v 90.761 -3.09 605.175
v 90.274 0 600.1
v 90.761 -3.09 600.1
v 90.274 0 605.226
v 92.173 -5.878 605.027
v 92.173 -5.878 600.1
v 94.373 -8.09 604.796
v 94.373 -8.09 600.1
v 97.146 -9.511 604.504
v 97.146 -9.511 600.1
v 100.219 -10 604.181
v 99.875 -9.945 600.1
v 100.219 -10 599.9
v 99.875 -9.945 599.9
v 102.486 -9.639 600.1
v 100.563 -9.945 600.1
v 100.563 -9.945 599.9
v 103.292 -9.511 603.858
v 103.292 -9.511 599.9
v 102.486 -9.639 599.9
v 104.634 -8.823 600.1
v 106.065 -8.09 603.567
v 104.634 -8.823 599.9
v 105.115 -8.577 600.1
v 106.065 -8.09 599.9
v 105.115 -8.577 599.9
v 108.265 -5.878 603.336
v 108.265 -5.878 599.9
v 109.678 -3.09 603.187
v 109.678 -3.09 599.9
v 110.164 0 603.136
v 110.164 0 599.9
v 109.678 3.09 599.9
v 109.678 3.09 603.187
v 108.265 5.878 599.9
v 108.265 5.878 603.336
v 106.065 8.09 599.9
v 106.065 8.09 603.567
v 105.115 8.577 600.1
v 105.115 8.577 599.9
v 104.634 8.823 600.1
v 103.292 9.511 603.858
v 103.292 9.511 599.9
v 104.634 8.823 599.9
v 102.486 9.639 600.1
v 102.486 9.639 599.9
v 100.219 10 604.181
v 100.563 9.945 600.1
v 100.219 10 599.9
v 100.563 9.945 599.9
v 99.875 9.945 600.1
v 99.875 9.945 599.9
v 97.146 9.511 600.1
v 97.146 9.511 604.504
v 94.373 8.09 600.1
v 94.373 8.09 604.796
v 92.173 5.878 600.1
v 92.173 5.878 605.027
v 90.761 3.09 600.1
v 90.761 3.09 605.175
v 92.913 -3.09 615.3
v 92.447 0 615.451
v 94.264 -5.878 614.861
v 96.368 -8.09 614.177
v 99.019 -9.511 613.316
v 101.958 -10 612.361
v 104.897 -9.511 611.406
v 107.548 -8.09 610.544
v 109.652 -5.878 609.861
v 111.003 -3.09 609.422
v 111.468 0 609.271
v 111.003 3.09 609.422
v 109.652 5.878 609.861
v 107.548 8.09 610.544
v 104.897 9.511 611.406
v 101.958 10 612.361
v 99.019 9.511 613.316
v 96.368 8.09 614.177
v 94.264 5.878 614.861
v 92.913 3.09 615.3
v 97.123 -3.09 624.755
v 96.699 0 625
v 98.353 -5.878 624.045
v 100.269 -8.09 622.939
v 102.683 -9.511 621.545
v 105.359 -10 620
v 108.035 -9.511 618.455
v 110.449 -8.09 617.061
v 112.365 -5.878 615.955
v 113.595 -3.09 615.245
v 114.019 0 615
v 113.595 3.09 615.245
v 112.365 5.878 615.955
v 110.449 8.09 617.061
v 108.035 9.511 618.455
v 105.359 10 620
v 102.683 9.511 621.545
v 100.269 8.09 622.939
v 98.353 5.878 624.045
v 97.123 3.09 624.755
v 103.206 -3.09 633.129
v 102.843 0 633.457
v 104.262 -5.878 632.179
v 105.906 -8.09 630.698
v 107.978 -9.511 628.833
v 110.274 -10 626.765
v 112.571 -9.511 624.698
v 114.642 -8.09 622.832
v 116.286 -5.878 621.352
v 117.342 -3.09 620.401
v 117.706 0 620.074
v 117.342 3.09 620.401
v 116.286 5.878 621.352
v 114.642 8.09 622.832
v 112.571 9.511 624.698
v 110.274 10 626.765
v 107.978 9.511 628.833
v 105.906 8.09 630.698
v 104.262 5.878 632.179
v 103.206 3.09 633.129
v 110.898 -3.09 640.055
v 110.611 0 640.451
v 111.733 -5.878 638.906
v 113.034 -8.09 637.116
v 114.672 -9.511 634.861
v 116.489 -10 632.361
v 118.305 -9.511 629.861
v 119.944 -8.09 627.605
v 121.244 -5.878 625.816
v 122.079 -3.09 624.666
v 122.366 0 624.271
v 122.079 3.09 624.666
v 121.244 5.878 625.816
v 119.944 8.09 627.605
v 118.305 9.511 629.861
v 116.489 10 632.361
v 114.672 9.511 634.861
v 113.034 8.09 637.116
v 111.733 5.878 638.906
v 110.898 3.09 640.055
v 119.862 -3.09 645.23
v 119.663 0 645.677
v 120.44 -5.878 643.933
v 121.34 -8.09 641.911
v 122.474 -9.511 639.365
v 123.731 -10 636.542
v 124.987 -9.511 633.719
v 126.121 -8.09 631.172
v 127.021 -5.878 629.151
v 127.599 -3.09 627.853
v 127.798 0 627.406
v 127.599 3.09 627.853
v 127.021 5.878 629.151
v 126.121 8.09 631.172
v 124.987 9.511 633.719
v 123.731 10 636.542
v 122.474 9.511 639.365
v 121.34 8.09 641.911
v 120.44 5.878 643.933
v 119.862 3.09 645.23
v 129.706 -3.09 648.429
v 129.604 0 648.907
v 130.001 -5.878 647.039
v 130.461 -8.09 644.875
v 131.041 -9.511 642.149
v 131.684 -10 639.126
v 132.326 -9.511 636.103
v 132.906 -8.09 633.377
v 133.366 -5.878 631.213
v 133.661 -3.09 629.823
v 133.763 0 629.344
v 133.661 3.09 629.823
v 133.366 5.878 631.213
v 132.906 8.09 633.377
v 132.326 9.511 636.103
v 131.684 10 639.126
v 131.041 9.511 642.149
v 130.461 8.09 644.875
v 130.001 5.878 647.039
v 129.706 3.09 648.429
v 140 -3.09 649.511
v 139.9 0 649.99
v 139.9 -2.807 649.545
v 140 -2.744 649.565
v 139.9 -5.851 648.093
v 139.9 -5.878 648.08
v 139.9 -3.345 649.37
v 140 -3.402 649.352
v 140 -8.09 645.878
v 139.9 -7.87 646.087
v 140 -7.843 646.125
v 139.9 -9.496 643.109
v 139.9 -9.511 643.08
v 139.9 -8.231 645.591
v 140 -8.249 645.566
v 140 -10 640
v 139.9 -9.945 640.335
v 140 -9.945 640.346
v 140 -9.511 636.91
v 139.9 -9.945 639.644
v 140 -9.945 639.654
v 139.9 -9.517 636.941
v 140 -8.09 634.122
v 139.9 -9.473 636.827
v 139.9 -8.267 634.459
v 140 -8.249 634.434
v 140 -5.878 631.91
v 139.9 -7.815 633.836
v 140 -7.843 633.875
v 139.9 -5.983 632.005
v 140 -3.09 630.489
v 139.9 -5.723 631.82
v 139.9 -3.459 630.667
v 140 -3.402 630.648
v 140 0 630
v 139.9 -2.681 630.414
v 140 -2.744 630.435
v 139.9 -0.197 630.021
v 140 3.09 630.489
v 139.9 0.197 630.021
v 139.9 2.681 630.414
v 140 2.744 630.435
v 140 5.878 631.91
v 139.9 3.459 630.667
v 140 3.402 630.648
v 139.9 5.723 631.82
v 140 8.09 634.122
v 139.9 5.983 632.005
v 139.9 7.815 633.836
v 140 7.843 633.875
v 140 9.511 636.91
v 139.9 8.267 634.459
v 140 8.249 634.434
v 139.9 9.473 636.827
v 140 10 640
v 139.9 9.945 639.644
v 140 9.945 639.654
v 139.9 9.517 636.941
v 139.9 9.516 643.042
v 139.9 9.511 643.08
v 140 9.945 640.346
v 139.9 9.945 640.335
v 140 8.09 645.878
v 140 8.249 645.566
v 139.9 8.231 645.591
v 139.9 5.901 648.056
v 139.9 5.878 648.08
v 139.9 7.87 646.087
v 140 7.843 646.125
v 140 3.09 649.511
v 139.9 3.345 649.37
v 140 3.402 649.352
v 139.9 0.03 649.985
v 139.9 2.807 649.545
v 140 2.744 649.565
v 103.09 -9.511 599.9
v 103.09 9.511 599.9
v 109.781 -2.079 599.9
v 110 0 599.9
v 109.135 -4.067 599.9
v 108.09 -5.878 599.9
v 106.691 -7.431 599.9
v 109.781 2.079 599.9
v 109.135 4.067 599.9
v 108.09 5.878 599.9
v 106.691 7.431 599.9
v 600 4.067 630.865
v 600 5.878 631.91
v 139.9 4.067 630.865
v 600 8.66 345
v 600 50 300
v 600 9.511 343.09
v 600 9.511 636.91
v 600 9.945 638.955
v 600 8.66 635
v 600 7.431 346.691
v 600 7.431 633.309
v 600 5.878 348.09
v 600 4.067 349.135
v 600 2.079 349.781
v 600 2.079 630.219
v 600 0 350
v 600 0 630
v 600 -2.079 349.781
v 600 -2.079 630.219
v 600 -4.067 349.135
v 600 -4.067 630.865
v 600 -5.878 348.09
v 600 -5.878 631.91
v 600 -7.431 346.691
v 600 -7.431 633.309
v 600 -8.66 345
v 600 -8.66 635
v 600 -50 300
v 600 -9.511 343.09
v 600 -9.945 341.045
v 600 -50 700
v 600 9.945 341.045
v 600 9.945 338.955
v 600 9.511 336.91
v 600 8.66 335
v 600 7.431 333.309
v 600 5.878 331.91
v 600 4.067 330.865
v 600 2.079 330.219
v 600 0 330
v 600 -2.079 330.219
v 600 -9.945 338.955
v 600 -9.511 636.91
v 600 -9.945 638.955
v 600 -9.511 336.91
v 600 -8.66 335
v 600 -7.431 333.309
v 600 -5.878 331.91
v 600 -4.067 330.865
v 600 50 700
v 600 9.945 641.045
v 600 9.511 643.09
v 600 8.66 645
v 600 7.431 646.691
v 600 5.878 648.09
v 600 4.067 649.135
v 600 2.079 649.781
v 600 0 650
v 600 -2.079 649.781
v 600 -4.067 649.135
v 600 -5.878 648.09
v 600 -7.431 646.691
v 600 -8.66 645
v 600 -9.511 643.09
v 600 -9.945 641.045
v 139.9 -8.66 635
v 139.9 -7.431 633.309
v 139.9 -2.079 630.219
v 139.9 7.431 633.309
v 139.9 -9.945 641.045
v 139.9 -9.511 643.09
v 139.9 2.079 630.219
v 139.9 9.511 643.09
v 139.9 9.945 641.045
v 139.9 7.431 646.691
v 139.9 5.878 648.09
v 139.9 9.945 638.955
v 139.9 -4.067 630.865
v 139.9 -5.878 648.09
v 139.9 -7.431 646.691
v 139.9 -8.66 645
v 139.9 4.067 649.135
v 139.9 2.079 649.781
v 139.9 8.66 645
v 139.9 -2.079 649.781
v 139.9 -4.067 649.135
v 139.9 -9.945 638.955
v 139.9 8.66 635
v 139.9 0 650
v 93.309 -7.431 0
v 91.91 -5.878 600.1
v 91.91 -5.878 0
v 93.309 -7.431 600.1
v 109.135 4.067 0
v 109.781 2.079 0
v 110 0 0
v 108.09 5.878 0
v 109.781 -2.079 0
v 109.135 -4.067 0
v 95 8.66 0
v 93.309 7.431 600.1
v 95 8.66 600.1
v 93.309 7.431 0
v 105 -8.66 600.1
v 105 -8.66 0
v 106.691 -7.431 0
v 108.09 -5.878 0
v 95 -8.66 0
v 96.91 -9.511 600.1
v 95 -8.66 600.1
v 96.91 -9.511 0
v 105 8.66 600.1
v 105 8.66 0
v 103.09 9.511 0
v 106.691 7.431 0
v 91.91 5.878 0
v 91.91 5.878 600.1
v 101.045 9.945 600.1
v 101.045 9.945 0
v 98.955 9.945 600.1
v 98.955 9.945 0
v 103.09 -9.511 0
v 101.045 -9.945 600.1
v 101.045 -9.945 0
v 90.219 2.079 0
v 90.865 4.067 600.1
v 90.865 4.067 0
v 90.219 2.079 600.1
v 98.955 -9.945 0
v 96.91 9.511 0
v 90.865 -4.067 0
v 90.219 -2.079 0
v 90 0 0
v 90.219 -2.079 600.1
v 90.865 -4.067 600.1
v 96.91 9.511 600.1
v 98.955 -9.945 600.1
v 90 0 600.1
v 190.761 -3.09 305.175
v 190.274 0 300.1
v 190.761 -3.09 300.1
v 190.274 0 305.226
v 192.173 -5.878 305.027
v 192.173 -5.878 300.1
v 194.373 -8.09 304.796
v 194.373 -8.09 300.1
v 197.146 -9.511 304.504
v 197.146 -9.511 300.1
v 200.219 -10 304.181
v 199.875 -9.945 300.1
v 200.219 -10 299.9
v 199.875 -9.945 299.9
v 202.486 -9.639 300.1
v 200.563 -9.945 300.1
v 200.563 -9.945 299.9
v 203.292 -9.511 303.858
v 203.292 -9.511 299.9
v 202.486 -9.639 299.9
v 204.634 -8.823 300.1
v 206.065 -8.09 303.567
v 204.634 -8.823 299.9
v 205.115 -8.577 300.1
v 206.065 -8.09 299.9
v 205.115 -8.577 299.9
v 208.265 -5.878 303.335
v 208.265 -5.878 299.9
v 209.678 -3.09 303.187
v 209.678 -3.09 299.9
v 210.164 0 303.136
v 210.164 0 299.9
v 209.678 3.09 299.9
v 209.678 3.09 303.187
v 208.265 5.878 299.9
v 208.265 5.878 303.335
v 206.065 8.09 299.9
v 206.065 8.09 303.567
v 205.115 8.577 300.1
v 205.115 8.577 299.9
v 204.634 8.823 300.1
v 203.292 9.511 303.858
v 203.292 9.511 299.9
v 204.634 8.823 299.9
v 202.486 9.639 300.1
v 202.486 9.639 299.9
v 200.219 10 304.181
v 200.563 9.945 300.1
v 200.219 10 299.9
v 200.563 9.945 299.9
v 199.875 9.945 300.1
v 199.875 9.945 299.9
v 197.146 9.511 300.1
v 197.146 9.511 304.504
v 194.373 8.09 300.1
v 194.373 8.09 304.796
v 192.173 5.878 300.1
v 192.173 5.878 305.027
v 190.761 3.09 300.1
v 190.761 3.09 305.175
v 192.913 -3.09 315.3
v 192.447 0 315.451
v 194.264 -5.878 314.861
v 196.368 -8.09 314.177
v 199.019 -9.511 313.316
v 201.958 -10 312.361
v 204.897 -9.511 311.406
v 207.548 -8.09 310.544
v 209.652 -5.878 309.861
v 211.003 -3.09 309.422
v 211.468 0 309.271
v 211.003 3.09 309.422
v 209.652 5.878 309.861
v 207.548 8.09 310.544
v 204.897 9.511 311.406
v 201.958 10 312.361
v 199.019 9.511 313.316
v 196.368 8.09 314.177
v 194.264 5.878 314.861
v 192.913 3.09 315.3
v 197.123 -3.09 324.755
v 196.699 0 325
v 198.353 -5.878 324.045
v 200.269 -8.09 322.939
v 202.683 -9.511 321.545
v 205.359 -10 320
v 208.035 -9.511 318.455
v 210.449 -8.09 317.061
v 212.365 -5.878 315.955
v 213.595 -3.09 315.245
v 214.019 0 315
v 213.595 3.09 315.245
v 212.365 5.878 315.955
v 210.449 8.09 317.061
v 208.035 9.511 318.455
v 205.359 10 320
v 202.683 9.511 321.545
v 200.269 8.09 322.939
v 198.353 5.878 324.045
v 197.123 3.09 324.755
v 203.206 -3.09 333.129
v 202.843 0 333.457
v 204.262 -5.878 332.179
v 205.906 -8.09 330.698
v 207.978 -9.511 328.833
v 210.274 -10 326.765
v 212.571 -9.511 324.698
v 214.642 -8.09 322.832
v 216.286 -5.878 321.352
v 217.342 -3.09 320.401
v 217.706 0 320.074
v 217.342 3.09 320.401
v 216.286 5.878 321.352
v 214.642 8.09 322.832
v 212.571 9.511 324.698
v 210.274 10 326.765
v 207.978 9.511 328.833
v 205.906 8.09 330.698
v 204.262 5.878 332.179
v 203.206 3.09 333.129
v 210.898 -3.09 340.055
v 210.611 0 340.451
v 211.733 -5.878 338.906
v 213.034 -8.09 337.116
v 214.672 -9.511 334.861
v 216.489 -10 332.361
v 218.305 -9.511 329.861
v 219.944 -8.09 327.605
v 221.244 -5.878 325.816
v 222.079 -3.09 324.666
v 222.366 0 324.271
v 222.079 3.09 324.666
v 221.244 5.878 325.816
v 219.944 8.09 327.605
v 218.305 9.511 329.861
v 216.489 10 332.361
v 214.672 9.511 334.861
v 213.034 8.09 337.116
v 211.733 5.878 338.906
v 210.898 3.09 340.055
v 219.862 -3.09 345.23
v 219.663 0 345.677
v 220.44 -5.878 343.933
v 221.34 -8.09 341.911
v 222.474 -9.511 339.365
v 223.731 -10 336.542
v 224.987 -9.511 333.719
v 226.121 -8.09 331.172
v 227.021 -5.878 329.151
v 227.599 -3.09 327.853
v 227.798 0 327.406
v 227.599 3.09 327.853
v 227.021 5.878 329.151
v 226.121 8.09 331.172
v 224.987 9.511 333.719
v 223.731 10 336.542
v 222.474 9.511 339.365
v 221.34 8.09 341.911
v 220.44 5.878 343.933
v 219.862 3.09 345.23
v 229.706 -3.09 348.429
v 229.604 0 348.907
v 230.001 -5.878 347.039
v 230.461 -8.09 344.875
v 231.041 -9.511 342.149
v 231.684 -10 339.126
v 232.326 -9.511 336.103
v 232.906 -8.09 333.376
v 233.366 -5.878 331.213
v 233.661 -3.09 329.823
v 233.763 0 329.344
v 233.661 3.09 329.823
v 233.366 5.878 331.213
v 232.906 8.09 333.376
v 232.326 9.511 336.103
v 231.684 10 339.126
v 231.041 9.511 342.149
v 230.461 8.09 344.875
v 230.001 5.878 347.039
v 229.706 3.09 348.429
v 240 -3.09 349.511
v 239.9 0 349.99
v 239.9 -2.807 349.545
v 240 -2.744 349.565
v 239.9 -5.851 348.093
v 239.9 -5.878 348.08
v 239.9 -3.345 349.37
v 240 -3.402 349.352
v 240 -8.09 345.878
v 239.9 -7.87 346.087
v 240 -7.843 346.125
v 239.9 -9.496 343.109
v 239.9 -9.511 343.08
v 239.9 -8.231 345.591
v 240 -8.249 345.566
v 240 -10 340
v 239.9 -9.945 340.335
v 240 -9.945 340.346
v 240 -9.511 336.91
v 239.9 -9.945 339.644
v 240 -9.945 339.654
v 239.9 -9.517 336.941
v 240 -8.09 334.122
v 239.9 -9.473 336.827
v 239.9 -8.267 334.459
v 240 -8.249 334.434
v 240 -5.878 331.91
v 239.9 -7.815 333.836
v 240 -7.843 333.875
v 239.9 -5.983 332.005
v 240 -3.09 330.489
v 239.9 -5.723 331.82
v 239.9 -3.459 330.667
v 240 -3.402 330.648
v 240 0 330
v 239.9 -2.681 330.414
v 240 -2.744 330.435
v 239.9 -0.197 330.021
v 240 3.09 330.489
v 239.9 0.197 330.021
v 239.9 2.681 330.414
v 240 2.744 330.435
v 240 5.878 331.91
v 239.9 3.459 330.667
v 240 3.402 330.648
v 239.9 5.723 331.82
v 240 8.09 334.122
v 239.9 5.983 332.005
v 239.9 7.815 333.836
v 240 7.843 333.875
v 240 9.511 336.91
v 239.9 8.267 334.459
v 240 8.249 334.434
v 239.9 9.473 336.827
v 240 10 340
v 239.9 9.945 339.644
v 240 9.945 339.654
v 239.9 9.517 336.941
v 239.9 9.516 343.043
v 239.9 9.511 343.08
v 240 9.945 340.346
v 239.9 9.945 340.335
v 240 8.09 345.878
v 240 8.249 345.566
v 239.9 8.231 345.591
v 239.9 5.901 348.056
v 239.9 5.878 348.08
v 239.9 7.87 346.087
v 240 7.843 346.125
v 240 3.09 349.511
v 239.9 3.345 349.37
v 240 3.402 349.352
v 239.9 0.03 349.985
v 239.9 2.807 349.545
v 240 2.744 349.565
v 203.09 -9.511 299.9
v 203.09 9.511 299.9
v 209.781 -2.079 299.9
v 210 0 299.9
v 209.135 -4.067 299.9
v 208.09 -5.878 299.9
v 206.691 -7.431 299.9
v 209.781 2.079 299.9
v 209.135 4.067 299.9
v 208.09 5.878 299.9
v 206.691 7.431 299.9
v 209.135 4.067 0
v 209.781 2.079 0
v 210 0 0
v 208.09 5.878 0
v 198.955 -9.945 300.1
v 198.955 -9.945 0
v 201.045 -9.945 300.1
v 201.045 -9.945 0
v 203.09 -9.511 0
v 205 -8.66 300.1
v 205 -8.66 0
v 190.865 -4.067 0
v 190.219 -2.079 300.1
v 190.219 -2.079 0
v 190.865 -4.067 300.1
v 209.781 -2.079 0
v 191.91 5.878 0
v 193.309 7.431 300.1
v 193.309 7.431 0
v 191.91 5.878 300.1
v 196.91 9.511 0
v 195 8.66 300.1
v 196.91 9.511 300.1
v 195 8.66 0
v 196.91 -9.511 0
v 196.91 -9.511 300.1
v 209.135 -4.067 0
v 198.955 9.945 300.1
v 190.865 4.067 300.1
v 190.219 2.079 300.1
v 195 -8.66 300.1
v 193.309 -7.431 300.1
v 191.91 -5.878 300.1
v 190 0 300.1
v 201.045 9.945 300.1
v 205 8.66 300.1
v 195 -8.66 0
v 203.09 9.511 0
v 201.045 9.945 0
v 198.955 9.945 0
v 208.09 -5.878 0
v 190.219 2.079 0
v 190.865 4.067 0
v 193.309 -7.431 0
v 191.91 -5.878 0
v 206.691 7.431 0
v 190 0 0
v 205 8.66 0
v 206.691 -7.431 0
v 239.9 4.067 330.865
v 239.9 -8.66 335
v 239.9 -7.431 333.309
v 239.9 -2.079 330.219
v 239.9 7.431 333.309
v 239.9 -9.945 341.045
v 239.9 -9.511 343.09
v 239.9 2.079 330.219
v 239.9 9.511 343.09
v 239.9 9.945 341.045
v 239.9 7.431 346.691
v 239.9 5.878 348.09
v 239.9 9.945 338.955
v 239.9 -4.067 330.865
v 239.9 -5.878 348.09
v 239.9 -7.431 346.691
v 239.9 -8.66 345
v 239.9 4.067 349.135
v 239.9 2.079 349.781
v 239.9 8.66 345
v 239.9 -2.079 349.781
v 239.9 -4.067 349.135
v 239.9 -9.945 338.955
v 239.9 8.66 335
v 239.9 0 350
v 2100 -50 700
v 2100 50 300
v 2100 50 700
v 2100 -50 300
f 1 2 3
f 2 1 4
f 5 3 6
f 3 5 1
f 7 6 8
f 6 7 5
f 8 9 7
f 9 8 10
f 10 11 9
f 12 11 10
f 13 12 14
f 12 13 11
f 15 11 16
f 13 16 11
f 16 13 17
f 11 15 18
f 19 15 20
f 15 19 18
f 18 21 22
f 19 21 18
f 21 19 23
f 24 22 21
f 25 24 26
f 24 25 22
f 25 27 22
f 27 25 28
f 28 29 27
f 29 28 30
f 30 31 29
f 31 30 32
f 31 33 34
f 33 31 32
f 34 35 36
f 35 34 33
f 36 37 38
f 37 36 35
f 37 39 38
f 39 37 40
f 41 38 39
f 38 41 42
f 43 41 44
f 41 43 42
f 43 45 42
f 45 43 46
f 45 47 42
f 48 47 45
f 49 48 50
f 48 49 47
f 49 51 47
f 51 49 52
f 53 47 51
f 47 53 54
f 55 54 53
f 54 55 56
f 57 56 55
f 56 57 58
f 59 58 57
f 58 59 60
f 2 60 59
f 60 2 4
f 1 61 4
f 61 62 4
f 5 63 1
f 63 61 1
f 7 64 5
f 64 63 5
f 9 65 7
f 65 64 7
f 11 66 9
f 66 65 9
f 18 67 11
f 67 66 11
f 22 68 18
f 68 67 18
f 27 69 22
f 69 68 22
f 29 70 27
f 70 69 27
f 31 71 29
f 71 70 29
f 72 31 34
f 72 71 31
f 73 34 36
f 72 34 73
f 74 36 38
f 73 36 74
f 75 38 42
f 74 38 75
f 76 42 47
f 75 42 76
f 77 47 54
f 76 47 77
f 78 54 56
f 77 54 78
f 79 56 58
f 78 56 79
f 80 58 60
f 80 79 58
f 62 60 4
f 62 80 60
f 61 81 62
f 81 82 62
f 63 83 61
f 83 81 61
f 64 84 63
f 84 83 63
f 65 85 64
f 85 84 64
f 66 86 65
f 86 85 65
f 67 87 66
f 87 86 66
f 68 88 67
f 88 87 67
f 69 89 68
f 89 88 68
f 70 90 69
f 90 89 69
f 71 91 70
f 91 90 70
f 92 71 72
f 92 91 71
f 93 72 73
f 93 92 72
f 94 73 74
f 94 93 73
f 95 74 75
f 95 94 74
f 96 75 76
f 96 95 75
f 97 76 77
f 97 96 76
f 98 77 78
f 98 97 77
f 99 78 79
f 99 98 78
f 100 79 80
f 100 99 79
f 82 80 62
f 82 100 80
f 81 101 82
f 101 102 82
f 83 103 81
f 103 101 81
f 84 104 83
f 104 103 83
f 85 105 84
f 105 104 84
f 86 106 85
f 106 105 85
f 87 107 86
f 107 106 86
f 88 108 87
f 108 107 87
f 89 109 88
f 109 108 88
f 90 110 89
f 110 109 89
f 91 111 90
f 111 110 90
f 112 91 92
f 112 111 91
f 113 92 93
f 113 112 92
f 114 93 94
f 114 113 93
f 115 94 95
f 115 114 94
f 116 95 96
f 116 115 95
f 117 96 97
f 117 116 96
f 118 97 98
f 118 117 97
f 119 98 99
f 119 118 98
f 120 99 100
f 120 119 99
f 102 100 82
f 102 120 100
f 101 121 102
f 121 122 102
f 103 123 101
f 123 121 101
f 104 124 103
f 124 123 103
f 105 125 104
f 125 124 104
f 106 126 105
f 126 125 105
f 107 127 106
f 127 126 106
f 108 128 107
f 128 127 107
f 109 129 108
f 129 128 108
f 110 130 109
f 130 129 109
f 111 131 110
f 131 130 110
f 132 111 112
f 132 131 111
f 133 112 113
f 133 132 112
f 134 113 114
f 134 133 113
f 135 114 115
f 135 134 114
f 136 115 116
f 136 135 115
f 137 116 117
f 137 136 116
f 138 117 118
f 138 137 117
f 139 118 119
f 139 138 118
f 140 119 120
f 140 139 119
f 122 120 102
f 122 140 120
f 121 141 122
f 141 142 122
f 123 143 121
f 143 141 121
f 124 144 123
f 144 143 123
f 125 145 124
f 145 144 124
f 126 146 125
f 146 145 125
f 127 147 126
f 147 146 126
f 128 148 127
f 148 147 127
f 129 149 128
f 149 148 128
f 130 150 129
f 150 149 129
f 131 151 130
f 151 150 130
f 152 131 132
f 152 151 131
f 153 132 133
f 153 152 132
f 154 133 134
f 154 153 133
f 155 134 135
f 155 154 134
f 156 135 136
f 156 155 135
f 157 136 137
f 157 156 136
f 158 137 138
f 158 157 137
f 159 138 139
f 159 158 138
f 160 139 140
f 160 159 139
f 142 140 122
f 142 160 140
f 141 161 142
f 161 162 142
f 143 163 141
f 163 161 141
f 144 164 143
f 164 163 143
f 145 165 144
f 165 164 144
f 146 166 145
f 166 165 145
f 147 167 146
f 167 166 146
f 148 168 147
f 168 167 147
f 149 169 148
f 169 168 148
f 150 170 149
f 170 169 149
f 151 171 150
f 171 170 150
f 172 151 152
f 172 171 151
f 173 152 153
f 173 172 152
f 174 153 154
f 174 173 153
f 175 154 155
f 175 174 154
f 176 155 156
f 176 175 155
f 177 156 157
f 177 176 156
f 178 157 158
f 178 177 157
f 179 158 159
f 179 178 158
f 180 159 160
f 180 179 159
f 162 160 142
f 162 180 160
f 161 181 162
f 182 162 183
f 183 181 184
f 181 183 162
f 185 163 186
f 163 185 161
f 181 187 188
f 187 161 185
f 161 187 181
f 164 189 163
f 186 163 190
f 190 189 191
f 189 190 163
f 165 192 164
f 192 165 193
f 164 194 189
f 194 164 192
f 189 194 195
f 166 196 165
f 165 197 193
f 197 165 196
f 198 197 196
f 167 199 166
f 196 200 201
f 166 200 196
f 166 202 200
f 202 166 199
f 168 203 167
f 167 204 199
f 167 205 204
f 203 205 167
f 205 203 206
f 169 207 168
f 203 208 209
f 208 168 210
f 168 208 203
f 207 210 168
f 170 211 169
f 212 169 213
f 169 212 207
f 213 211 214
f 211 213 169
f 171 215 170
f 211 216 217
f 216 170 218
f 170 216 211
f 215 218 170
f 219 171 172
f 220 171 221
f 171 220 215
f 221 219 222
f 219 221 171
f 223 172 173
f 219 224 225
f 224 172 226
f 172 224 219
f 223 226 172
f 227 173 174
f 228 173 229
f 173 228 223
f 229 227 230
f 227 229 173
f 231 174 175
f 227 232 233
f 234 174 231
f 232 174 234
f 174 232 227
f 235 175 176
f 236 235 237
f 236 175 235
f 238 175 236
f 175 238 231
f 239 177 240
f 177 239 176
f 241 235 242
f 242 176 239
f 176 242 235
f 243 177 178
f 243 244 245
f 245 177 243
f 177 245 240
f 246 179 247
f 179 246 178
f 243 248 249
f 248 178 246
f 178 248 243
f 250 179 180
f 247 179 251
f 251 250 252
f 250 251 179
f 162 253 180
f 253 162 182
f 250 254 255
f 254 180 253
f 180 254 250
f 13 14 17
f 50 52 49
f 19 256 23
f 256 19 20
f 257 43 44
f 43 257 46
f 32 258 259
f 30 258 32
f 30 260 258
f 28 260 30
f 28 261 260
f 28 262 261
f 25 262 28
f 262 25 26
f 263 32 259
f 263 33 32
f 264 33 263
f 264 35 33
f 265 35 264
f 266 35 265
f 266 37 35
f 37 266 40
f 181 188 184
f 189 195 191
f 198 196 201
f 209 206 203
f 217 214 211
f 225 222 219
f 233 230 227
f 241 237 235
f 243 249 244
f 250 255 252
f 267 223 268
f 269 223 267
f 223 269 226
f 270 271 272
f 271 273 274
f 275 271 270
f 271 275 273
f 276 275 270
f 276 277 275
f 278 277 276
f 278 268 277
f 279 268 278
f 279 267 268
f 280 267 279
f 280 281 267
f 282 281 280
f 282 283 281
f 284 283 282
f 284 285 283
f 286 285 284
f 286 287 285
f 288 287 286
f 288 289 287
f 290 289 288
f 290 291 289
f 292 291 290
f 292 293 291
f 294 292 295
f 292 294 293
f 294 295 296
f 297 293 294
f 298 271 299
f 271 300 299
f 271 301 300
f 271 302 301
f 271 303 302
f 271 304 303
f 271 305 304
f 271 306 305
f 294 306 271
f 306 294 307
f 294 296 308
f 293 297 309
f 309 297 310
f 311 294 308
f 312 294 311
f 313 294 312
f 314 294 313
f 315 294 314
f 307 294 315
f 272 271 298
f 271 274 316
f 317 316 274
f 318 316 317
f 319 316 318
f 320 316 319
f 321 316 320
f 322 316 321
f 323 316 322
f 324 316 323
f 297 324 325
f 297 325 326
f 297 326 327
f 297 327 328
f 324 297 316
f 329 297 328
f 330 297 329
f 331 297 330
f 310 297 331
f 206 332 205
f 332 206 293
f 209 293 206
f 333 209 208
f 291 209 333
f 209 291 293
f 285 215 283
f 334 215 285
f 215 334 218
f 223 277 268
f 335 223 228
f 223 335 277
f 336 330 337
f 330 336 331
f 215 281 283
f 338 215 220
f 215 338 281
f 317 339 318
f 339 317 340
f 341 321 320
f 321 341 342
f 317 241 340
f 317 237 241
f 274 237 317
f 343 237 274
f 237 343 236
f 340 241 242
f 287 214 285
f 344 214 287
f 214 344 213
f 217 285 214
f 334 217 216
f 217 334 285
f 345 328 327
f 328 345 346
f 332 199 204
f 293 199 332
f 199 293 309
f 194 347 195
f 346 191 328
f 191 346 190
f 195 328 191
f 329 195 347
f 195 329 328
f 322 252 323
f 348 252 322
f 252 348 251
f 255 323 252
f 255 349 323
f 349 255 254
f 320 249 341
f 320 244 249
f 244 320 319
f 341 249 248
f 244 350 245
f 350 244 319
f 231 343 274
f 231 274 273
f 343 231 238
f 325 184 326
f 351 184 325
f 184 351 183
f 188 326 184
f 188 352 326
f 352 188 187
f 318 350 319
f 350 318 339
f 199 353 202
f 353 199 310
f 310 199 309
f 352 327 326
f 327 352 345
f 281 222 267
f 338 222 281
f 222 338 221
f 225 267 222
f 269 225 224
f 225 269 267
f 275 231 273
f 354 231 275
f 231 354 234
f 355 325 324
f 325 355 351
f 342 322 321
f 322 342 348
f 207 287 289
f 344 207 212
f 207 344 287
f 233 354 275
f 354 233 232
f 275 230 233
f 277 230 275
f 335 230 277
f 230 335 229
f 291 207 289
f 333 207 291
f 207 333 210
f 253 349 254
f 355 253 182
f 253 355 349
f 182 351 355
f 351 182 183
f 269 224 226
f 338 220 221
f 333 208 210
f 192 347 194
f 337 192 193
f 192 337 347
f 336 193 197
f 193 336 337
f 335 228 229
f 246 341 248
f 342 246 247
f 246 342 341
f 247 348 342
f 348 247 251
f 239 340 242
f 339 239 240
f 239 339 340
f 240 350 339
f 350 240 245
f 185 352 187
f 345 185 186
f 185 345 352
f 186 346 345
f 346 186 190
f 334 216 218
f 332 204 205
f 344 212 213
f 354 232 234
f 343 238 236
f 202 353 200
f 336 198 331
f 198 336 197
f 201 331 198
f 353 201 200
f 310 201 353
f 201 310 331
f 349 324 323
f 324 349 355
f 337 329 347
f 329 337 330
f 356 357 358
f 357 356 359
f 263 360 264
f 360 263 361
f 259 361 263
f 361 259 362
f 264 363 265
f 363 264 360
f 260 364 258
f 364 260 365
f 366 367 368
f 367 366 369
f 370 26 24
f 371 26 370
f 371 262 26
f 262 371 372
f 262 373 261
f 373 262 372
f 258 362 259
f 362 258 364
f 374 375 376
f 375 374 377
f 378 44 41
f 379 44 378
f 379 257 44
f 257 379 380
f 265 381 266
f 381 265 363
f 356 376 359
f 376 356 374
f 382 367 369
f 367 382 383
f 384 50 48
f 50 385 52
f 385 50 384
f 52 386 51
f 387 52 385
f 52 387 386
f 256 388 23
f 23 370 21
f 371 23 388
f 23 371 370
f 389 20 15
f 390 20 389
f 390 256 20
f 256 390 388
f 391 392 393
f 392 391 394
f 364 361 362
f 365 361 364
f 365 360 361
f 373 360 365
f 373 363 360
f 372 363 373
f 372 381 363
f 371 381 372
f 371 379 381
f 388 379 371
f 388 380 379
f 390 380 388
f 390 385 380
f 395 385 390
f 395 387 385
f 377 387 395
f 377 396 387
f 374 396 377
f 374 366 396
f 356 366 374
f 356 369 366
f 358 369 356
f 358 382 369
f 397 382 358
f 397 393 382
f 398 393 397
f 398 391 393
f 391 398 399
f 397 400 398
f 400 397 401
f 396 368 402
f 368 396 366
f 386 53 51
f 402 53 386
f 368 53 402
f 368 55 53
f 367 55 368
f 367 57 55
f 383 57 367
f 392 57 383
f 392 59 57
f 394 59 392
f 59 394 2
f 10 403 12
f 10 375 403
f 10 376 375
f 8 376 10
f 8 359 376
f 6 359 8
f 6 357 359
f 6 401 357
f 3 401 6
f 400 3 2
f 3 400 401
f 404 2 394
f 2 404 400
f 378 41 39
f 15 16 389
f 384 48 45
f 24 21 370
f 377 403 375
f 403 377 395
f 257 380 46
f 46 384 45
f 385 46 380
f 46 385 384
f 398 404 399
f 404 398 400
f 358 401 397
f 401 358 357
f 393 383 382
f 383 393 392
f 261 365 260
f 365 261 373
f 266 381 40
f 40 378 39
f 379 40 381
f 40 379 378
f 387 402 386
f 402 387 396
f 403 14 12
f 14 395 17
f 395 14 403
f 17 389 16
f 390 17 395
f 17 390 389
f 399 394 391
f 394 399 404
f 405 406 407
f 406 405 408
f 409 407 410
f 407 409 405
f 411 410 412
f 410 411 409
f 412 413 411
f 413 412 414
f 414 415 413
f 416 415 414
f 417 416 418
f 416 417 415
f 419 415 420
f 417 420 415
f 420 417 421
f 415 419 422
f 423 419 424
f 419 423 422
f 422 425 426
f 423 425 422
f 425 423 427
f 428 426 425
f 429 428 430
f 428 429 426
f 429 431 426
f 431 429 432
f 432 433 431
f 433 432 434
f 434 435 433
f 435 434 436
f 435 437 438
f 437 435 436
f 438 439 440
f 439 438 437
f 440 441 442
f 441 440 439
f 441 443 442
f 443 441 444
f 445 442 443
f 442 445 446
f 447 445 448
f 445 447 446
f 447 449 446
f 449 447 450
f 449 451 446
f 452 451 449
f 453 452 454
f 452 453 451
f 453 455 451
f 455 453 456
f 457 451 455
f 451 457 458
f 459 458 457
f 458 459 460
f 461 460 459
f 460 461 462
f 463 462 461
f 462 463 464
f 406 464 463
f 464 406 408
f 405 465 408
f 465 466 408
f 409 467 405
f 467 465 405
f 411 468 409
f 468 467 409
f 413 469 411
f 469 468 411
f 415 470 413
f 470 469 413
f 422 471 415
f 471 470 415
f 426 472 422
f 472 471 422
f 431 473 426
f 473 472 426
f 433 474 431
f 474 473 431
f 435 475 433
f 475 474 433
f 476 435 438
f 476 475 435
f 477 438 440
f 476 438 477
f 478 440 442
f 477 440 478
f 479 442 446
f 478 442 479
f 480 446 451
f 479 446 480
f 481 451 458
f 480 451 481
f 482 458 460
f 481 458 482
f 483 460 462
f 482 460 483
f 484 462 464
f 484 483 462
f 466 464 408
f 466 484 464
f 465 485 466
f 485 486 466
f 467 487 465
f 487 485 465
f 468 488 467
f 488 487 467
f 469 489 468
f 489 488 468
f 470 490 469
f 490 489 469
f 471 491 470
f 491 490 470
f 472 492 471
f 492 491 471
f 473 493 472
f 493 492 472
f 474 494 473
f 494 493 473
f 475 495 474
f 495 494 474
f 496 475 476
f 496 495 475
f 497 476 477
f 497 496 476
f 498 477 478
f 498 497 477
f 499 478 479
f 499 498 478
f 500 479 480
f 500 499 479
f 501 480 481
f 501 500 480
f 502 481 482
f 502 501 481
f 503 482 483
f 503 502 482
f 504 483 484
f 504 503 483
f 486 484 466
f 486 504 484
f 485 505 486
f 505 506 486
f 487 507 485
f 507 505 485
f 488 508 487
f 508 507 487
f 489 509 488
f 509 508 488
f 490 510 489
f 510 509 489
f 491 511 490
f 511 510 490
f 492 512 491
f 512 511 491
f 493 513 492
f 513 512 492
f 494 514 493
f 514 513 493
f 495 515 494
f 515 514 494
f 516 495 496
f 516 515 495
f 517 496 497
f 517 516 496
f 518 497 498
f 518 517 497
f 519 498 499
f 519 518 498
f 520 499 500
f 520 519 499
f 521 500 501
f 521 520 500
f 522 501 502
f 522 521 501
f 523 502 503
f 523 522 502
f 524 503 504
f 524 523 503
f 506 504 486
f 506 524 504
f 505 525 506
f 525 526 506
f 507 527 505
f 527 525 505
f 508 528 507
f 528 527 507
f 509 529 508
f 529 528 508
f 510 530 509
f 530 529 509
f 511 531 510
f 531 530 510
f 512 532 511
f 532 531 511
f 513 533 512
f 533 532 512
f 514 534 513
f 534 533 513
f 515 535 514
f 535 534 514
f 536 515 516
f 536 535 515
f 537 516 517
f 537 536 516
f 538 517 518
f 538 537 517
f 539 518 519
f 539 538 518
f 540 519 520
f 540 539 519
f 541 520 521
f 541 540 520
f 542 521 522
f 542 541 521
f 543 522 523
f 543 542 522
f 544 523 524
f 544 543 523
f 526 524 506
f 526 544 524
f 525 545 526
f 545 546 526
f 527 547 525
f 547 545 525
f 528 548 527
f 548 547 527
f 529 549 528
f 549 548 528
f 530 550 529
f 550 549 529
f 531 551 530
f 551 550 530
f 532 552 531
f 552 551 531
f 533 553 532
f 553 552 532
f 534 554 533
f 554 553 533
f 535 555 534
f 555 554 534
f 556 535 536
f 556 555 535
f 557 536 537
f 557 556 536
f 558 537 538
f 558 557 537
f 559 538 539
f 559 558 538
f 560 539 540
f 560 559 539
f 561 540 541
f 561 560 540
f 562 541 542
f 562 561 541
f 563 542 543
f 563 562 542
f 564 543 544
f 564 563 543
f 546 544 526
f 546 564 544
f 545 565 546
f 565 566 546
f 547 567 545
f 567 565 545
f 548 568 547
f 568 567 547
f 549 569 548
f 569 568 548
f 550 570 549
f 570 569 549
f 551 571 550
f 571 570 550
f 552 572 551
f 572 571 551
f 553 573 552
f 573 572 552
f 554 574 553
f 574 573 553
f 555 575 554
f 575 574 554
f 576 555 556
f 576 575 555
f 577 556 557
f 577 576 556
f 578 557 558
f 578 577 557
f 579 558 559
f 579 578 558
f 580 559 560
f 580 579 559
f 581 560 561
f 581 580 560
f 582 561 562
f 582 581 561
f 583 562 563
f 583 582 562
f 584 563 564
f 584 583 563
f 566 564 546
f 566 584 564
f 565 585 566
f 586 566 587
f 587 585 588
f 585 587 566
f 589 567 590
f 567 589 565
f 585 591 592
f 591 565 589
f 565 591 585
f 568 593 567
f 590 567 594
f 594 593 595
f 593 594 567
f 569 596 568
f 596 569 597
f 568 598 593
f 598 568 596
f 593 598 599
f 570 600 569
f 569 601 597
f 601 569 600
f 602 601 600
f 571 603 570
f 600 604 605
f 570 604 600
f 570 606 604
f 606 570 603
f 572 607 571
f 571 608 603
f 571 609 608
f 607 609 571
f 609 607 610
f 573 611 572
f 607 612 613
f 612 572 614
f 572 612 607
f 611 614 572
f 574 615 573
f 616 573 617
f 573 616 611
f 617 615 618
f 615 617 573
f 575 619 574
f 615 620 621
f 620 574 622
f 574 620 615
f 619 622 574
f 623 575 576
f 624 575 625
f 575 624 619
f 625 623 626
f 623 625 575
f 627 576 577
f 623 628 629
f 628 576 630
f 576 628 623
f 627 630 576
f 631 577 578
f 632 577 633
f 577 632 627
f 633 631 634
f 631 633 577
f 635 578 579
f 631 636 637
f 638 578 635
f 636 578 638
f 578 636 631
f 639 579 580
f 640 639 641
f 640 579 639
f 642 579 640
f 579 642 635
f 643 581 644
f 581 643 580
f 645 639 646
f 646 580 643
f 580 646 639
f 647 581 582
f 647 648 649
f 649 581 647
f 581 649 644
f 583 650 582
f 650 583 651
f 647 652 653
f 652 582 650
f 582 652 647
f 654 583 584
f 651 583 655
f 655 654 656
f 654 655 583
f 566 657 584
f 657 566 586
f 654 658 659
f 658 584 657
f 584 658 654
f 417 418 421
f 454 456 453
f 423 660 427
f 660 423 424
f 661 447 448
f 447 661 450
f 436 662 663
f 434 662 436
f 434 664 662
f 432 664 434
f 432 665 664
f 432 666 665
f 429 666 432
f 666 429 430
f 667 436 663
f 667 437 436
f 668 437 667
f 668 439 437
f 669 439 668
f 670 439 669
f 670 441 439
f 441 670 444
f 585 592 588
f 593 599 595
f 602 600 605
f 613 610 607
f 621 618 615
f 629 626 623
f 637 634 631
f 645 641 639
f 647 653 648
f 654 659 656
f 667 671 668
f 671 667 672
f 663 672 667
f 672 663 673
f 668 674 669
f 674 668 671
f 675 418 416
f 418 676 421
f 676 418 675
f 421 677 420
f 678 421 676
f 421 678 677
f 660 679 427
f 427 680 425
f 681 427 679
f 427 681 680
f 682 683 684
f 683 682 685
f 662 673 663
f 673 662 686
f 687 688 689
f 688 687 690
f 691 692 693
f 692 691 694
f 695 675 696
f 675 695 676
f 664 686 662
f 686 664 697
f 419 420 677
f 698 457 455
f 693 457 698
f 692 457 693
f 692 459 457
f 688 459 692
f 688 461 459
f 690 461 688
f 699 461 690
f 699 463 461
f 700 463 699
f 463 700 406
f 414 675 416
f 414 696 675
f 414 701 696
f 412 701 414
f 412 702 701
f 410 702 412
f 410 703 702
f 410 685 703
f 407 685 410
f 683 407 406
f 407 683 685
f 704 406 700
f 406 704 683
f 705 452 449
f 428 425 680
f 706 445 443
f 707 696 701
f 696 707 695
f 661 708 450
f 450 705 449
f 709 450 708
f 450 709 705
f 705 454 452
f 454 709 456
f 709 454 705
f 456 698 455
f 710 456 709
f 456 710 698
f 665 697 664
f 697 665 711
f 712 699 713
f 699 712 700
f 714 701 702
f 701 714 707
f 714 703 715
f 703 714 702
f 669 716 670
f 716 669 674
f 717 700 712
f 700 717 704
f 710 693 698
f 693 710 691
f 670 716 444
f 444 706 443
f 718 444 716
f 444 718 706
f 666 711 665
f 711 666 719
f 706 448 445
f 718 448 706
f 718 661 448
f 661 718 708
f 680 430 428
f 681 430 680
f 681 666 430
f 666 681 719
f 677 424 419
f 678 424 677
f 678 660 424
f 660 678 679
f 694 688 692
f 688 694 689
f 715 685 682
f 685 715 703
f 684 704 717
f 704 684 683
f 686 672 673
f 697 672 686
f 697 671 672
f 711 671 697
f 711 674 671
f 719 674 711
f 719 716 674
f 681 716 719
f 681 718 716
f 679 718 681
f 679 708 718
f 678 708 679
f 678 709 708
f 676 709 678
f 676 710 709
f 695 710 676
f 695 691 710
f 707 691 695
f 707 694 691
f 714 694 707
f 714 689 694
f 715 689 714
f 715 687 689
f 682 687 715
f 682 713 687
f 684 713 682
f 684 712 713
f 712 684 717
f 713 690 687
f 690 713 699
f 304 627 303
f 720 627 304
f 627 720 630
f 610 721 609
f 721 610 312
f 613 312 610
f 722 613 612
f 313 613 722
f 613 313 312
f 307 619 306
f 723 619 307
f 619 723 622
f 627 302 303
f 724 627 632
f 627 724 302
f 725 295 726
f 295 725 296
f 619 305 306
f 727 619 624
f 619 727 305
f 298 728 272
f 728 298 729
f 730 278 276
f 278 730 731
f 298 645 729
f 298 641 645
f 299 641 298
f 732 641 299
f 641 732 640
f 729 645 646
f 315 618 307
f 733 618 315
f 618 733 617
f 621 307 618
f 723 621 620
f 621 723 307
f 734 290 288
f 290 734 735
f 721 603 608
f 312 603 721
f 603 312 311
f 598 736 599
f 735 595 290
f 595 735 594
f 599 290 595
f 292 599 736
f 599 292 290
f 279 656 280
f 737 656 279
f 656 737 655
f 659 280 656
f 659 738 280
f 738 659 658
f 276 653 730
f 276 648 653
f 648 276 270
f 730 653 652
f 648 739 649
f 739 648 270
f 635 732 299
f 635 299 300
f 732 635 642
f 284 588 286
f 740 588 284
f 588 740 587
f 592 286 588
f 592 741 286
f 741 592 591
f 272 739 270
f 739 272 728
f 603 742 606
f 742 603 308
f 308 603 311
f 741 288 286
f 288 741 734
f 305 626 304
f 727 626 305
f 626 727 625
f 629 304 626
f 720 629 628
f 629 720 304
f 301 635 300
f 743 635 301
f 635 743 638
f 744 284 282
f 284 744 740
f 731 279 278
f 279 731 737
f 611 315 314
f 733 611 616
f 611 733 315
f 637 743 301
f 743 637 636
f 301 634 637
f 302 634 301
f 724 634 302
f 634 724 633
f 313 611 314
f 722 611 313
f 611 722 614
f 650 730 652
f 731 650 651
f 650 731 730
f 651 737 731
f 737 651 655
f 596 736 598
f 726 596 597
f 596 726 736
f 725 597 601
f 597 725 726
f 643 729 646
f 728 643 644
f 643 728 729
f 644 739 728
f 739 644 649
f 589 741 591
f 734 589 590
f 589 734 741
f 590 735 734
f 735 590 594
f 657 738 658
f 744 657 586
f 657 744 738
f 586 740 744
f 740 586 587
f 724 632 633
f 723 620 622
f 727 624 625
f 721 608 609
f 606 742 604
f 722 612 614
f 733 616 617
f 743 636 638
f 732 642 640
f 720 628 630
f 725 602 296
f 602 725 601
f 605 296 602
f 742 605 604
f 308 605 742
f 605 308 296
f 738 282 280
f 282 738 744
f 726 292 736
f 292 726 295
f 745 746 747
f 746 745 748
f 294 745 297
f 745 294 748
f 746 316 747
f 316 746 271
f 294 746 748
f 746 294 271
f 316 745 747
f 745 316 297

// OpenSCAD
// file: serial_hull.scad
//serial_hull() {
//    cube(10, center=true);
//    translate([20,0,0]) sphere(10);
//    translate([30,0,0]) sphere(5);
//}


module serial_hull() {
    for(i=[0:$children-2]) {
        hull() {
            children(i);
            children(i+1);
        }
    }
}

module wedge(angle, extent=100, height=100, center=true) {
    module wedge_if(sub) {
        rotate([0,0,(angle > sub ? sub : angle)])
            translate([0,0,(center==true ? -height/2 : 0)])
                cube([extent,0.1,height]);
    }
    
    module wedge_wall() {
        for(r=[0:45:angle-1])
        rotate([0,0,r])
            translate([0,0,(center==true ? -height/2 : 0)])
                cube([extent,0.1,height]);
    }
    
    module convex_wedge(a) {
        translate([0,0,(center==true ? -height/2 : 0)])
            serial_hull() {
                for(r=[0:45:a-1])
                    rotate([0,0,r]) cube([extent,0.1,height]);
                rotate([0,0,a]) cube([extent,0.1,height]);
            }
    }
    
    if(angle<=180) {
        intersection() {
            for(i=[0:$children-1]) children(i);
            convex_wedge(angle);
        }
    } else {
        difference() {
            for(i=[0:$children-1]) children(i);
            scale([1,-1,1]) convex_wedge(360-angle);
        }
    }

//    serial_hull() {
//        wedge_if(0);
//        wedge_if(45*1);
//        wedge_if(45*2);
//        wedge_if(45*3);
//        wedge_if(45*4);
//        wedge_if(45*5);
//        wedge_if(45*6);
//        wedge_if(45*7);
//        wedge_if(45*8);
//    }
}

//difference() {
//    rotate_extrude() translate([40,0,0]) circle(r=30);
//    wedge(angle=247);
//}

wedge(angle=90)
    rotate_extrude(convexity=10) translate([40,0,0]) circle(r=30);
// main file
// battery + pipe

use <./serial_hull.scad>

multi = 1000;

delta = 0.1;

bat_height = 0.4 * multi;
bat_length = 1.5 * multi;
bat_th = 0.1 * multi;

space_wall_bat = 0.6 * multi;
space_wall_pipe = 0.1 * multi;
space_floor_bat = 0.3 * multi;
space_pipes = 0.1 * multi;


pipe_length = 0.5 * multi;
pipe_height = space_floor_bat + 0.3 * multi;
pipe_height_low = space_floor_bat + 0.1 * multi;
pipe_d = 0.02 * multi;
pipe_2d = 2*pipe_d;



module battery() {
    translate([space_wall_bat,bat_th/2,space_floor_bat])
    rotate([90, 0, 0]) {
        color("white") cube([bat_length, bat_height, bat_th]);
    }
}

module round_pipe() {
    translate([pipe_d*2,0,0])
        rotate([0, -90, 90]) {
            wedge(angle=90, extent = pipe_d*3, height = pipe_d)
                rotate_extrude()
                    translate([pipe_2d,0,0]) circle(d=pipe_d, $fn=20);
        }
}

module pipe_top() {
    color("brown") union() {
        translate([0, 0, pipe_height]) round_pipe();
        translate([pipe_2d - delta, 0, pipe_height + pipe_2d])    
            rotate([0,90,0])
                cylinder(d=pipe_d, pipe_length - pipe_2d + delta);
        cylinder(d=pipe_d, pipe_height + delta);
    }
}

module pipe_low() {
   color("brown") union() {
        translate([space_pipes, 0, pipe_height_low - space_pipes])
            round_pipe();
        translate([space_pipes,0,0])
            cylinder(d=pipe_d, pipe_height_low + delta - space_pipes);
        translate([
            pipe_2d - delta + space_pipes,
            0,
            pipe_height_low + pipe_2d- space_pipes])    
                rotate([0,90,0])
                    cylinder(
                        d=pipe_d,
                        pipe_length - pipe_2d - space_pipes + delta);
        }
}


module create_bat() {
   union() {
        battery();
        translate([space_pipes,0,0]) {
            pipe_top();
            pipe_low();
        }
    }
}

create_bat();
